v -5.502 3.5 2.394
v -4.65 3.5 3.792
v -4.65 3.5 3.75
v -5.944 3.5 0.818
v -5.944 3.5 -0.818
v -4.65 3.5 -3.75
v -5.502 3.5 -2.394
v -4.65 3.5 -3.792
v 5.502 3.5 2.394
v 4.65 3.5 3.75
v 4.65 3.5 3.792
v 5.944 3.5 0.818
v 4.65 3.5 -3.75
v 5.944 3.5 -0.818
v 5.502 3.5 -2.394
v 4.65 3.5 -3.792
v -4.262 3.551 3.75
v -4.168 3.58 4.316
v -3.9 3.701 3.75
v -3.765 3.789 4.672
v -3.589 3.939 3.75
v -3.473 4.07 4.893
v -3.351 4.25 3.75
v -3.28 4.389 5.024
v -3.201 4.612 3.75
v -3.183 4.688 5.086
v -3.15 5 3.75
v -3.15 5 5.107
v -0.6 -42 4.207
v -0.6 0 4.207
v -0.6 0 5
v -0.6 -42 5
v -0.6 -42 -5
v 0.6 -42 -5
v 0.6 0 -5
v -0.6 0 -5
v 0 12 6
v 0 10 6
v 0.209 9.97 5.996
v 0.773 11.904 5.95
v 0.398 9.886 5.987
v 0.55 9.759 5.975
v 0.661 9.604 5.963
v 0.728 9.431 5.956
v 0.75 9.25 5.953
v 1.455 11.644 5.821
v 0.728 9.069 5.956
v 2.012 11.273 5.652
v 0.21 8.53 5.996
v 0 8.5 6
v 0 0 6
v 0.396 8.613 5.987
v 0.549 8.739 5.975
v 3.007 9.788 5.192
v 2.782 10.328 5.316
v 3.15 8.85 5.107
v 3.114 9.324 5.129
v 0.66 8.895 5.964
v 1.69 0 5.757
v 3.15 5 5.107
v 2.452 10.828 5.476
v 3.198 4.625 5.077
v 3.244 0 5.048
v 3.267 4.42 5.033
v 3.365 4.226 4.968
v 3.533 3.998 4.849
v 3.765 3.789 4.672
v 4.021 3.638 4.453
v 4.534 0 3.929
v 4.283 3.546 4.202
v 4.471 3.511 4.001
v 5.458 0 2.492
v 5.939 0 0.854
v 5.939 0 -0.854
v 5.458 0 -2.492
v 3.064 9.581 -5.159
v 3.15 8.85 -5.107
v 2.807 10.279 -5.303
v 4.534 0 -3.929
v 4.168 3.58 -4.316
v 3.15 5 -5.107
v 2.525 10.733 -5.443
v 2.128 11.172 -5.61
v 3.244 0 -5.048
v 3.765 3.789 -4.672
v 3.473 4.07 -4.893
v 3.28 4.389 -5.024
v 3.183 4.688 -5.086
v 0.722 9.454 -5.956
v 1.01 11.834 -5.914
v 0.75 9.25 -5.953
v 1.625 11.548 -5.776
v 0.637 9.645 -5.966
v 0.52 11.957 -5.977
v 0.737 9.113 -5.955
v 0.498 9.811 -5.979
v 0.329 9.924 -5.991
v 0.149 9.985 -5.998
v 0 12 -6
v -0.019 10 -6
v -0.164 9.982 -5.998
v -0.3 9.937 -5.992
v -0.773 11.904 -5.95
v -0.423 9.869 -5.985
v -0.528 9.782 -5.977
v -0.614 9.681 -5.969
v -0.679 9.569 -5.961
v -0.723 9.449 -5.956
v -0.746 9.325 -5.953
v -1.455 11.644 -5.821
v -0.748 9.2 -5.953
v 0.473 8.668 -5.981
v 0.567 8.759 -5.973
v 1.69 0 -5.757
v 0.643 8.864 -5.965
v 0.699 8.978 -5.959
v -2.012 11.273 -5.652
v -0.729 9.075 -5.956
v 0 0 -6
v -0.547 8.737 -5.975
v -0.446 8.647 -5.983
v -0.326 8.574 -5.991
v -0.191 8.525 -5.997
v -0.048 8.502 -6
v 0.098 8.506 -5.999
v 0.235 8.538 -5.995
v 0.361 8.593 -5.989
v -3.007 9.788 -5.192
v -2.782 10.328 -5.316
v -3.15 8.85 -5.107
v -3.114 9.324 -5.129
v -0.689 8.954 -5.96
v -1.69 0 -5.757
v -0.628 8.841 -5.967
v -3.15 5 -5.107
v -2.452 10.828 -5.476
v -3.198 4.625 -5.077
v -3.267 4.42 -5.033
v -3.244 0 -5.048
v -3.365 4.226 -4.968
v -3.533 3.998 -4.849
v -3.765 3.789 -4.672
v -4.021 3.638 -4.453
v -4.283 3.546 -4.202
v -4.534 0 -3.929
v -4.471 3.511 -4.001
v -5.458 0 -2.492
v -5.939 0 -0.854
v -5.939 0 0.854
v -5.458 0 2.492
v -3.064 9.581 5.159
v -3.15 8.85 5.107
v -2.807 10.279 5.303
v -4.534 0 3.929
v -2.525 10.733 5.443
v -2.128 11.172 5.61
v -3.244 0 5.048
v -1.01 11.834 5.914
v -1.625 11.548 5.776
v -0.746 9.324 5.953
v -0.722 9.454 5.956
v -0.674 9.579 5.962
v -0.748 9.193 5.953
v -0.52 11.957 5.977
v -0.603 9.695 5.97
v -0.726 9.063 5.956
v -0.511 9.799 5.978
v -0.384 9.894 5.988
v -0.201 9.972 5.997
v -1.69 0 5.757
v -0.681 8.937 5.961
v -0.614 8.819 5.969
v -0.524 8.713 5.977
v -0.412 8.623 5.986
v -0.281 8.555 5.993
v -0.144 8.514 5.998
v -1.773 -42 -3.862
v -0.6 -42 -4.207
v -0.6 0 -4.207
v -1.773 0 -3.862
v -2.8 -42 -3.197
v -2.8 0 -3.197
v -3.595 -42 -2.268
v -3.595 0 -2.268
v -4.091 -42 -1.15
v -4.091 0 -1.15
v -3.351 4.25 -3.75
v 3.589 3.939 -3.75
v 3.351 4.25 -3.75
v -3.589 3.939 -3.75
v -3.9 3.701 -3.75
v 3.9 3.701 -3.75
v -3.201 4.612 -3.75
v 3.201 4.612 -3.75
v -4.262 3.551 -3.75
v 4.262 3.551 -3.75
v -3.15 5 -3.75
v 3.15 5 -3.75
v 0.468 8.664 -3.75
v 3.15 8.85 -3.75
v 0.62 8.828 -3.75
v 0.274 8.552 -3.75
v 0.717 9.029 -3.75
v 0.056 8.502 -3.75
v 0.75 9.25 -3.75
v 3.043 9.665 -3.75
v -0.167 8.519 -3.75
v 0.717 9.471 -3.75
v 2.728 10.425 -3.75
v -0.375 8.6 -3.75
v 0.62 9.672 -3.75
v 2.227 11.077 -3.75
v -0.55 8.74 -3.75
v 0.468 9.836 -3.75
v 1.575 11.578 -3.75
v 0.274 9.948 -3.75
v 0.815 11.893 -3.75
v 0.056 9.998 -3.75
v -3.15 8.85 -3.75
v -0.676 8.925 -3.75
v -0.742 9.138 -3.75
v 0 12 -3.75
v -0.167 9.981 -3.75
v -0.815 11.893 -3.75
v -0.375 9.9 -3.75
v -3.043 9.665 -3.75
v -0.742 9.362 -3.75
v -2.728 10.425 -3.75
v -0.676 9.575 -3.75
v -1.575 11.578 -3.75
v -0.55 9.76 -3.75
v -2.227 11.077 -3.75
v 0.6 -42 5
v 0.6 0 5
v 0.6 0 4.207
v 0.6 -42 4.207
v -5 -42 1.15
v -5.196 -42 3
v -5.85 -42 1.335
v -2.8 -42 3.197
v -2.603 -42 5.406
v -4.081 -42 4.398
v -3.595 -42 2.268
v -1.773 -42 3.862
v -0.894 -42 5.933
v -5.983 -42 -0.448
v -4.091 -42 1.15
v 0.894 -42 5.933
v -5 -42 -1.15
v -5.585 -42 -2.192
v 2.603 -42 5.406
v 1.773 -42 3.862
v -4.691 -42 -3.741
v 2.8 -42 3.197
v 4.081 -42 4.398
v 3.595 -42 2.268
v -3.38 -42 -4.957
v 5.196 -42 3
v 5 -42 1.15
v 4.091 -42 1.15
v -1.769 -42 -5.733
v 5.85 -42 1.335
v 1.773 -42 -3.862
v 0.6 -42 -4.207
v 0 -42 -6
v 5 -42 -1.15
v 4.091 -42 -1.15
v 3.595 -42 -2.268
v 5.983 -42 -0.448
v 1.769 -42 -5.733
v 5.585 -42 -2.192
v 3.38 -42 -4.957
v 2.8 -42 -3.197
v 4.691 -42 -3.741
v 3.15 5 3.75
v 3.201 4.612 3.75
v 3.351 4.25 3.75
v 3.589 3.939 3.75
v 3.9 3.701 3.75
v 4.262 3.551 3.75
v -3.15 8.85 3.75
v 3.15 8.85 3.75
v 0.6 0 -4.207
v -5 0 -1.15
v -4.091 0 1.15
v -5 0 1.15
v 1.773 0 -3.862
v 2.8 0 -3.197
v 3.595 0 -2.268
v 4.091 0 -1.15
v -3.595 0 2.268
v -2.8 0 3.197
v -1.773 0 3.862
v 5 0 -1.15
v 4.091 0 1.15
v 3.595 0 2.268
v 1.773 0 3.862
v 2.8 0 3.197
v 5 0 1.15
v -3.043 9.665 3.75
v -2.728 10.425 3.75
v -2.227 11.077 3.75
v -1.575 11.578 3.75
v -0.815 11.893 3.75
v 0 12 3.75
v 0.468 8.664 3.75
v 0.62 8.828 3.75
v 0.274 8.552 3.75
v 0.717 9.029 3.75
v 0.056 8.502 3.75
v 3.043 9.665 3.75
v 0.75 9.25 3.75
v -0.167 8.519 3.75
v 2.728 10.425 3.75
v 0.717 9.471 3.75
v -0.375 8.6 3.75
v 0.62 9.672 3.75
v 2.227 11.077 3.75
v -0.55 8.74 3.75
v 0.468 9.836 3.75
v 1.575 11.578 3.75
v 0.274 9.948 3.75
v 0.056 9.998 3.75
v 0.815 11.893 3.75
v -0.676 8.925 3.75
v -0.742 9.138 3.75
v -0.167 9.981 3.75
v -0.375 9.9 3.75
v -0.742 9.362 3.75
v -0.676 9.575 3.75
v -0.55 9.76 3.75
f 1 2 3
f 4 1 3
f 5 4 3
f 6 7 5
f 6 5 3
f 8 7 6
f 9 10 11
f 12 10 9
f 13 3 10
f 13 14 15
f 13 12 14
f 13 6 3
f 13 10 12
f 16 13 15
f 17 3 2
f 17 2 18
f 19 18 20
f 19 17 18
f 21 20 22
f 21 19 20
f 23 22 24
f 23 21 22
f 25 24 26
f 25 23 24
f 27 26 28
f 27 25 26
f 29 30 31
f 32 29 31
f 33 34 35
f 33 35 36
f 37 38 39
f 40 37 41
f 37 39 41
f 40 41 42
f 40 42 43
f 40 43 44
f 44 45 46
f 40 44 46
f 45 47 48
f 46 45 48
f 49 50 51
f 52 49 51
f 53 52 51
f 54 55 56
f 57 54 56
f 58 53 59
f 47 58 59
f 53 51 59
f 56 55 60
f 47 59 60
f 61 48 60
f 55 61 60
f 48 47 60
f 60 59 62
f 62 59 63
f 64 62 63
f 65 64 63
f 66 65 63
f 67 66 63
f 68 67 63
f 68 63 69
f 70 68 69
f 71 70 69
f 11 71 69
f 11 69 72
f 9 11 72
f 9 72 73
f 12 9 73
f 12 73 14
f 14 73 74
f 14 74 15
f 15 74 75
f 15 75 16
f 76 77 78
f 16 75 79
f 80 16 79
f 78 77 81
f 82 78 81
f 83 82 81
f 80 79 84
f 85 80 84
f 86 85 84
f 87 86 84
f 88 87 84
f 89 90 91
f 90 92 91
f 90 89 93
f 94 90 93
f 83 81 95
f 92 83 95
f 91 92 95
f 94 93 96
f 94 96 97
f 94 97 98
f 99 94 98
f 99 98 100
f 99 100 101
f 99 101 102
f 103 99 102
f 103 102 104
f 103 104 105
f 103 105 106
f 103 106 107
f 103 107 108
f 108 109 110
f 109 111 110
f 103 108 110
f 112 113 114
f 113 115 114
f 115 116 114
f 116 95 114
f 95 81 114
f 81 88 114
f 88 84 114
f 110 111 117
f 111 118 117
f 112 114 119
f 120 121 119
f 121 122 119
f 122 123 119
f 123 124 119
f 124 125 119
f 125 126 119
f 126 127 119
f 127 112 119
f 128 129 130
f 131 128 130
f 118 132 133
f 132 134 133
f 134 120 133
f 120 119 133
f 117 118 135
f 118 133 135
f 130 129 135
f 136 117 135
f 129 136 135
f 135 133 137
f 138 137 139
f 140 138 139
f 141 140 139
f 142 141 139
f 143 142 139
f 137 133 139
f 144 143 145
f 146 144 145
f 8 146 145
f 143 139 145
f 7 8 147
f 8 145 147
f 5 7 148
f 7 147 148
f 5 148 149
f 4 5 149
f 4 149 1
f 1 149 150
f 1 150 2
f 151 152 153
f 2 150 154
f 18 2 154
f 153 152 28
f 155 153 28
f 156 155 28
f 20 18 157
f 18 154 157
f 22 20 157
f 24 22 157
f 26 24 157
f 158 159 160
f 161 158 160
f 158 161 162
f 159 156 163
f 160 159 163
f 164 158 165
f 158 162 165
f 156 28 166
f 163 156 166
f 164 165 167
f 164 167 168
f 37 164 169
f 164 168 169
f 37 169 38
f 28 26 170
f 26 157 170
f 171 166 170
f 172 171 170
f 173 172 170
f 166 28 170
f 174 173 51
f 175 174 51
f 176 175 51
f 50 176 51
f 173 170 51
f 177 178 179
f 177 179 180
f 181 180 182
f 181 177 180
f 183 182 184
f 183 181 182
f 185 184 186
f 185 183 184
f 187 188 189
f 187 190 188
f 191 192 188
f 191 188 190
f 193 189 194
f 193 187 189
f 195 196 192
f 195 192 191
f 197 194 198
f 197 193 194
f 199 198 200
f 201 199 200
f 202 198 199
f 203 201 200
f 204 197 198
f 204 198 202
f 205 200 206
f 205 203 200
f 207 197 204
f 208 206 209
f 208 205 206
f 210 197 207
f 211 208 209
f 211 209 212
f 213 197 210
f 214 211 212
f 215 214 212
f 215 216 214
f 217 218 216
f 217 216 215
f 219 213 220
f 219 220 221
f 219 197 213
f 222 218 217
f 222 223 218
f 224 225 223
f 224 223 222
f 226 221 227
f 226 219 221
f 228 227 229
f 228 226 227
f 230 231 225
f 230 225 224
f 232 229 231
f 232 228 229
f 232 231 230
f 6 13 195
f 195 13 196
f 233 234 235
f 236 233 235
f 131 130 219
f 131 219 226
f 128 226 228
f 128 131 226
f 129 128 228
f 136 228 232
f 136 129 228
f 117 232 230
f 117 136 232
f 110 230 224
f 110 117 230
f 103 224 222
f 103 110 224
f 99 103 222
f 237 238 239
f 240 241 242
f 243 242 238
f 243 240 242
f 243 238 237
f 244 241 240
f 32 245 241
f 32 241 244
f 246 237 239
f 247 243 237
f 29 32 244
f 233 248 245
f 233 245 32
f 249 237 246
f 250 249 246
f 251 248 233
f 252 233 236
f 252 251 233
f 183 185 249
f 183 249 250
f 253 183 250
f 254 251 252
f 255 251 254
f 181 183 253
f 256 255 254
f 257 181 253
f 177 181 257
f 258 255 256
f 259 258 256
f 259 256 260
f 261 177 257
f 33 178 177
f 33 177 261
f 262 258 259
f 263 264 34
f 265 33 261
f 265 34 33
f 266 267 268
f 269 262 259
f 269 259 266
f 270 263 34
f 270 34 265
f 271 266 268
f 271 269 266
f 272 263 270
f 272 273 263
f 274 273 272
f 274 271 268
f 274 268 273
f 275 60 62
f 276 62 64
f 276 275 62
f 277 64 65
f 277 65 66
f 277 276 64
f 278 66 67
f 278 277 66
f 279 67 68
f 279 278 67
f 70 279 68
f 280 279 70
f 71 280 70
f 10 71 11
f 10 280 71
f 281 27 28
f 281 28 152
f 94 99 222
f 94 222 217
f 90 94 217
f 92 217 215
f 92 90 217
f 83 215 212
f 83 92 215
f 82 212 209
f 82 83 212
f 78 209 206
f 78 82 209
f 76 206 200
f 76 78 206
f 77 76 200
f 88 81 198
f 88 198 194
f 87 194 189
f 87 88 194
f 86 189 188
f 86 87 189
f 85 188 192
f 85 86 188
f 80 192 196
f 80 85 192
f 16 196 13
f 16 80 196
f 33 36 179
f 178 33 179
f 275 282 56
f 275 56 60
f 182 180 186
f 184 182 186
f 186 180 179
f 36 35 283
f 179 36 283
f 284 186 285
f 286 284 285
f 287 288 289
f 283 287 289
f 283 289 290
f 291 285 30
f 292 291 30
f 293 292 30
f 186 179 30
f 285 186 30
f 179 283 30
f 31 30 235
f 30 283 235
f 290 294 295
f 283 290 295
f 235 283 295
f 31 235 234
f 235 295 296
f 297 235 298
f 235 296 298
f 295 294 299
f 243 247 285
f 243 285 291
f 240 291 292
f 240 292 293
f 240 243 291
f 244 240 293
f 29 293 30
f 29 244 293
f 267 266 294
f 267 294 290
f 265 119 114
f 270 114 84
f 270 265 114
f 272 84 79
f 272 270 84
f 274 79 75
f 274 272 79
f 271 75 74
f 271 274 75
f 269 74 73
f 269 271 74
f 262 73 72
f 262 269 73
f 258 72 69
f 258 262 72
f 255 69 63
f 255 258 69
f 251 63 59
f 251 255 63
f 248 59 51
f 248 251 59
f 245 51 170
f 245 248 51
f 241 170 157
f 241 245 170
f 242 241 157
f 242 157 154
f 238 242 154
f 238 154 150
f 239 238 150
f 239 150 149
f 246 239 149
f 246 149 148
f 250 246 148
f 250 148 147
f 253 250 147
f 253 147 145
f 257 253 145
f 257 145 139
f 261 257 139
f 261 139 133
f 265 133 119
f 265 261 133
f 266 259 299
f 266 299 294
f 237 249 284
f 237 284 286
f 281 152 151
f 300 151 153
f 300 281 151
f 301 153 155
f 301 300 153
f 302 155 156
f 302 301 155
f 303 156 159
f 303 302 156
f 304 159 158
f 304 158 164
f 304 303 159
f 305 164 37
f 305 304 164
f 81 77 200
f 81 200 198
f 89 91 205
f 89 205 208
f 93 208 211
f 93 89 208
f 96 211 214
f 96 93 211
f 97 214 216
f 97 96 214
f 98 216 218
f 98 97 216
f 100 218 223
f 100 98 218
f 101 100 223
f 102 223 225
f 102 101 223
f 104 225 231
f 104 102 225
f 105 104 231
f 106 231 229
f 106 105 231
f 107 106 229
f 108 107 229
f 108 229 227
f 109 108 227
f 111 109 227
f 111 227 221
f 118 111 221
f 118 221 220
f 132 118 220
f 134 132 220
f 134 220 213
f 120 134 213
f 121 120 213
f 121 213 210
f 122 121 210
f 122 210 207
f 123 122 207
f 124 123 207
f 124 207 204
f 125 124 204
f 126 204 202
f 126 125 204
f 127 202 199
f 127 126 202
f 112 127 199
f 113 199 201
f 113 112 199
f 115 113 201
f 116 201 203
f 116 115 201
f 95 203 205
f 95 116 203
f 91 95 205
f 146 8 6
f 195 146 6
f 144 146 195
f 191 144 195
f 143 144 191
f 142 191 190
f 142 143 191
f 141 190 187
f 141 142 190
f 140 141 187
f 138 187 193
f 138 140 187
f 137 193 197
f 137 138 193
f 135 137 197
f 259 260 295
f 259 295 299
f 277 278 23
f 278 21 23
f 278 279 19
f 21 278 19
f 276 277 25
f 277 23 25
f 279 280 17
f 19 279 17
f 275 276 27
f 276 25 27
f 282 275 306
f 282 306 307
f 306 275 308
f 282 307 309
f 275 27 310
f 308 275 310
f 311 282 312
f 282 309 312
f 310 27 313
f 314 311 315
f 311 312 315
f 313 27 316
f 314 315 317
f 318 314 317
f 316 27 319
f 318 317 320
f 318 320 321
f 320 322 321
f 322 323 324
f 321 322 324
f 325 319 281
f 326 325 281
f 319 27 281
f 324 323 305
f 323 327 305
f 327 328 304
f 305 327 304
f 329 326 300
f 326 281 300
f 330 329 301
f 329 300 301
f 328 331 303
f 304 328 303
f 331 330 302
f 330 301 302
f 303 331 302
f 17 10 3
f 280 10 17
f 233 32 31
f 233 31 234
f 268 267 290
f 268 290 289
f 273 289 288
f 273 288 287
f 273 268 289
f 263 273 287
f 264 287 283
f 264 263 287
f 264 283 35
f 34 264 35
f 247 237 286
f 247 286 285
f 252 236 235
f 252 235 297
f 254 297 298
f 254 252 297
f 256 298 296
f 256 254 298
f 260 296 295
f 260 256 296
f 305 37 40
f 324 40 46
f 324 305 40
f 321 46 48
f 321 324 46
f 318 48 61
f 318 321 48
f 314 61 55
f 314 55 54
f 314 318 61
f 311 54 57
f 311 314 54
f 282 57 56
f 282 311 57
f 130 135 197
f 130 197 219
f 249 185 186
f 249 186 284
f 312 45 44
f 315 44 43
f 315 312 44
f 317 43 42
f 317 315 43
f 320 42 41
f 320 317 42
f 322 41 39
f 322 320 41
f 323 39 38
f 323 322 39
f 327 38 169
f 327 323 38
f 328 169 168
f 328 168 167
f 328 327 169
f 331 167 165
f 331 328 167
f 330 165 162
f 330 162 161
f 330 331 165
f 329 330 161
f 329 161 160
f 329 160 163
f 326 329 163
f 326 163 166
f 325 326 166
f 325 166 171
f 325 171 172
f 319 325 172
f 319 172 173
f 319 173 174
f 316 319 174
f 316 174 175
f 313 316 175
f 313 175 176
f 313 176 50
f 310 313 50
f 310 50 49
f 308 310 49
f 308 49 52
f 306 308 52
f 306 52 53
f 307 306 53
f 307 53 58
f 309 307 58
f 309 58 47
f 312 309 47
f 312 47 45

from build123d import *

# Parameters (mm, degrees)
SKETCH1_R               = 6
BOSS_EXTRUDE1_DEPTH     = 12
CUT_EXTRUDE1_DEPTH      = 15.696938457
CUT_EXTRUDE1_DEPTH_BACK = 15.696938457
SKETCH2_W               = 7.5
SKETCH2_H               = 8.5
CUT_EXTRUDE2_DEPTH      = 15.696938457
CUT_EXTRUDE2_DEPTH_BACK = 15.696938457
SKETCH3_R               = 0.75
BOSS_EXTRUDE2_START     = 42
SKETCH4_R               = 6
BOSS_EXTRUDE2_DEPTH     = 42


with BuildPart() as part:
    # Sketch1 → Boss-Extrude1 (new body)
    with BuildSketch(Plane(origin=(0, 0, 0), x_dir=(1, 0, 0), z_dir=(0, 1, 0))):
        with Locations(Location((0, 0, 0), (0, 0, 270))):
            Circle(SKETCH1_R)
    extrude(amount=BOSS_EXTRUDE1_DEPTH)

    # Sketch2 → Cut-Extrude1 (cut, two sides: drawn at the far end of the back side and taken through both)
    with BuildSketch(Plane(origin=(0, 0, 0), x_dir=(0, 0, -1), z_dir=(1, 0, 0)).offset(-CUT_EXTRUDE1_DEPTH_BACK)):
        with Locations((0, 7.75)):
            Rectangle(SKETCH2_W, SKETCH2_H)
    extrude(amount=CUT_EXTRUDE1_DEPTH + CUT_EXTRUDE1_DEPTH_BACK, mode=Mode.SUBTRACT)

    # Sketch3 → Cut-Extrude2 (cut, two sides: drawn at the far end of the back side and taken through both)
    with BuildSketch(Plane.XY.offset(-CUT_EXTRUDE2_DEPTH_BACK)):
        with BuildLine():
            Line((-3.15, 5), (-3.15, 8.85))
            ThreePointArc((-3.15, 8.85), (-2.227386361, 11.077386361), (0, 12))
            Line((0, 12), (-4.683748499, 12))
            Line((-4.683748499, 12), (-4.683748499, 3.5))
            Line((-4.683748499, 3.5), (-4.65, 3.5))
            ThreePointArc((-4.65, 3.5), (-3.589339828, 3.939339828), (-3.15, 5))
        make_face()
        with BuildLine():
            Line((4.683748499, 12), (0, 12))
            ThreePointArc((0, 12), (2.227386361, 11.077386361), (3.15, 8.85))
            Line((3.15, 8.85), (3.15, 5))
            ThreePointArc((3.15, 5), (3.589339828, 3.939339828), (4.65, 3.5))
            Line((4.65, 3.5), (4.683748499, 3.5))
            Line((4.683748499, 3.5), (4.683748499, 12))
        make_face()
        with Locations((0, 9.25)):
            Circle(SKETCH3_R)
    extrude(amount=CUT_EXTRUDE2_DEPTH + CUT_EXTRUDE2_DEPTH_BACK, mode=Mode.SUBTRACT)

    # Sketch4 → Boss-Extrude2 (add)
    with BuildSketch(Plane.XZ.offset(BOSS_EXTRUDE2_START)):
        with Locations(Location((0, 0, 0), (0, 0, 270))):
            Circle(SKETCH4_R)
        with BuildLine():
            Line((-0.6, 4.207433897), (-0.6, 5))
            Line((-0.6, 5), (0.6, 5))
            Line((0.6, 5), (0.6, 4.207433897))
            ThreePointArc((0.6, 4.207433897), (2.799894973, 3.19735643), (4.091454509, 1.15))
            Line((4.091454509, 1.15), (5, 1.15))
            Line((5, 1.15), (5, -1.15))
            Line((5, -1.15), (4.091454509, -1.15))
            ThreePointArc((4.091454509, -1.15), (2.799894973, -3.19735643), (0.6, -4.207433897))
            Line((0.6, -4.207433897), (0.6, -5))
            Line((0.6, -5), (-0.6, -5))
            Line((-0.6, -5), (-0.6, -4.207433897))
            ThreePointArc((-0.6, -4.207433897), (-2.799894973, -3.19735643), (-4.091454509, -1.15))
            Line((-4.091454509, -1.15), (-5, -1.15))
            Line((-5, -1.15), (-5, 1.15))
            Line((-5, 1.15), (-4.091454509, 1.15))
            ThreePointArc((-4.091454509, 1.15), (-2.799894973, 3.19735643), (-0.6, 4.207433897))
        make_face(mode=Mode.SUBTRACT)
    extrude(amount=-BOSS_EXTRUDE2_DEPTH)


solid = part.part
